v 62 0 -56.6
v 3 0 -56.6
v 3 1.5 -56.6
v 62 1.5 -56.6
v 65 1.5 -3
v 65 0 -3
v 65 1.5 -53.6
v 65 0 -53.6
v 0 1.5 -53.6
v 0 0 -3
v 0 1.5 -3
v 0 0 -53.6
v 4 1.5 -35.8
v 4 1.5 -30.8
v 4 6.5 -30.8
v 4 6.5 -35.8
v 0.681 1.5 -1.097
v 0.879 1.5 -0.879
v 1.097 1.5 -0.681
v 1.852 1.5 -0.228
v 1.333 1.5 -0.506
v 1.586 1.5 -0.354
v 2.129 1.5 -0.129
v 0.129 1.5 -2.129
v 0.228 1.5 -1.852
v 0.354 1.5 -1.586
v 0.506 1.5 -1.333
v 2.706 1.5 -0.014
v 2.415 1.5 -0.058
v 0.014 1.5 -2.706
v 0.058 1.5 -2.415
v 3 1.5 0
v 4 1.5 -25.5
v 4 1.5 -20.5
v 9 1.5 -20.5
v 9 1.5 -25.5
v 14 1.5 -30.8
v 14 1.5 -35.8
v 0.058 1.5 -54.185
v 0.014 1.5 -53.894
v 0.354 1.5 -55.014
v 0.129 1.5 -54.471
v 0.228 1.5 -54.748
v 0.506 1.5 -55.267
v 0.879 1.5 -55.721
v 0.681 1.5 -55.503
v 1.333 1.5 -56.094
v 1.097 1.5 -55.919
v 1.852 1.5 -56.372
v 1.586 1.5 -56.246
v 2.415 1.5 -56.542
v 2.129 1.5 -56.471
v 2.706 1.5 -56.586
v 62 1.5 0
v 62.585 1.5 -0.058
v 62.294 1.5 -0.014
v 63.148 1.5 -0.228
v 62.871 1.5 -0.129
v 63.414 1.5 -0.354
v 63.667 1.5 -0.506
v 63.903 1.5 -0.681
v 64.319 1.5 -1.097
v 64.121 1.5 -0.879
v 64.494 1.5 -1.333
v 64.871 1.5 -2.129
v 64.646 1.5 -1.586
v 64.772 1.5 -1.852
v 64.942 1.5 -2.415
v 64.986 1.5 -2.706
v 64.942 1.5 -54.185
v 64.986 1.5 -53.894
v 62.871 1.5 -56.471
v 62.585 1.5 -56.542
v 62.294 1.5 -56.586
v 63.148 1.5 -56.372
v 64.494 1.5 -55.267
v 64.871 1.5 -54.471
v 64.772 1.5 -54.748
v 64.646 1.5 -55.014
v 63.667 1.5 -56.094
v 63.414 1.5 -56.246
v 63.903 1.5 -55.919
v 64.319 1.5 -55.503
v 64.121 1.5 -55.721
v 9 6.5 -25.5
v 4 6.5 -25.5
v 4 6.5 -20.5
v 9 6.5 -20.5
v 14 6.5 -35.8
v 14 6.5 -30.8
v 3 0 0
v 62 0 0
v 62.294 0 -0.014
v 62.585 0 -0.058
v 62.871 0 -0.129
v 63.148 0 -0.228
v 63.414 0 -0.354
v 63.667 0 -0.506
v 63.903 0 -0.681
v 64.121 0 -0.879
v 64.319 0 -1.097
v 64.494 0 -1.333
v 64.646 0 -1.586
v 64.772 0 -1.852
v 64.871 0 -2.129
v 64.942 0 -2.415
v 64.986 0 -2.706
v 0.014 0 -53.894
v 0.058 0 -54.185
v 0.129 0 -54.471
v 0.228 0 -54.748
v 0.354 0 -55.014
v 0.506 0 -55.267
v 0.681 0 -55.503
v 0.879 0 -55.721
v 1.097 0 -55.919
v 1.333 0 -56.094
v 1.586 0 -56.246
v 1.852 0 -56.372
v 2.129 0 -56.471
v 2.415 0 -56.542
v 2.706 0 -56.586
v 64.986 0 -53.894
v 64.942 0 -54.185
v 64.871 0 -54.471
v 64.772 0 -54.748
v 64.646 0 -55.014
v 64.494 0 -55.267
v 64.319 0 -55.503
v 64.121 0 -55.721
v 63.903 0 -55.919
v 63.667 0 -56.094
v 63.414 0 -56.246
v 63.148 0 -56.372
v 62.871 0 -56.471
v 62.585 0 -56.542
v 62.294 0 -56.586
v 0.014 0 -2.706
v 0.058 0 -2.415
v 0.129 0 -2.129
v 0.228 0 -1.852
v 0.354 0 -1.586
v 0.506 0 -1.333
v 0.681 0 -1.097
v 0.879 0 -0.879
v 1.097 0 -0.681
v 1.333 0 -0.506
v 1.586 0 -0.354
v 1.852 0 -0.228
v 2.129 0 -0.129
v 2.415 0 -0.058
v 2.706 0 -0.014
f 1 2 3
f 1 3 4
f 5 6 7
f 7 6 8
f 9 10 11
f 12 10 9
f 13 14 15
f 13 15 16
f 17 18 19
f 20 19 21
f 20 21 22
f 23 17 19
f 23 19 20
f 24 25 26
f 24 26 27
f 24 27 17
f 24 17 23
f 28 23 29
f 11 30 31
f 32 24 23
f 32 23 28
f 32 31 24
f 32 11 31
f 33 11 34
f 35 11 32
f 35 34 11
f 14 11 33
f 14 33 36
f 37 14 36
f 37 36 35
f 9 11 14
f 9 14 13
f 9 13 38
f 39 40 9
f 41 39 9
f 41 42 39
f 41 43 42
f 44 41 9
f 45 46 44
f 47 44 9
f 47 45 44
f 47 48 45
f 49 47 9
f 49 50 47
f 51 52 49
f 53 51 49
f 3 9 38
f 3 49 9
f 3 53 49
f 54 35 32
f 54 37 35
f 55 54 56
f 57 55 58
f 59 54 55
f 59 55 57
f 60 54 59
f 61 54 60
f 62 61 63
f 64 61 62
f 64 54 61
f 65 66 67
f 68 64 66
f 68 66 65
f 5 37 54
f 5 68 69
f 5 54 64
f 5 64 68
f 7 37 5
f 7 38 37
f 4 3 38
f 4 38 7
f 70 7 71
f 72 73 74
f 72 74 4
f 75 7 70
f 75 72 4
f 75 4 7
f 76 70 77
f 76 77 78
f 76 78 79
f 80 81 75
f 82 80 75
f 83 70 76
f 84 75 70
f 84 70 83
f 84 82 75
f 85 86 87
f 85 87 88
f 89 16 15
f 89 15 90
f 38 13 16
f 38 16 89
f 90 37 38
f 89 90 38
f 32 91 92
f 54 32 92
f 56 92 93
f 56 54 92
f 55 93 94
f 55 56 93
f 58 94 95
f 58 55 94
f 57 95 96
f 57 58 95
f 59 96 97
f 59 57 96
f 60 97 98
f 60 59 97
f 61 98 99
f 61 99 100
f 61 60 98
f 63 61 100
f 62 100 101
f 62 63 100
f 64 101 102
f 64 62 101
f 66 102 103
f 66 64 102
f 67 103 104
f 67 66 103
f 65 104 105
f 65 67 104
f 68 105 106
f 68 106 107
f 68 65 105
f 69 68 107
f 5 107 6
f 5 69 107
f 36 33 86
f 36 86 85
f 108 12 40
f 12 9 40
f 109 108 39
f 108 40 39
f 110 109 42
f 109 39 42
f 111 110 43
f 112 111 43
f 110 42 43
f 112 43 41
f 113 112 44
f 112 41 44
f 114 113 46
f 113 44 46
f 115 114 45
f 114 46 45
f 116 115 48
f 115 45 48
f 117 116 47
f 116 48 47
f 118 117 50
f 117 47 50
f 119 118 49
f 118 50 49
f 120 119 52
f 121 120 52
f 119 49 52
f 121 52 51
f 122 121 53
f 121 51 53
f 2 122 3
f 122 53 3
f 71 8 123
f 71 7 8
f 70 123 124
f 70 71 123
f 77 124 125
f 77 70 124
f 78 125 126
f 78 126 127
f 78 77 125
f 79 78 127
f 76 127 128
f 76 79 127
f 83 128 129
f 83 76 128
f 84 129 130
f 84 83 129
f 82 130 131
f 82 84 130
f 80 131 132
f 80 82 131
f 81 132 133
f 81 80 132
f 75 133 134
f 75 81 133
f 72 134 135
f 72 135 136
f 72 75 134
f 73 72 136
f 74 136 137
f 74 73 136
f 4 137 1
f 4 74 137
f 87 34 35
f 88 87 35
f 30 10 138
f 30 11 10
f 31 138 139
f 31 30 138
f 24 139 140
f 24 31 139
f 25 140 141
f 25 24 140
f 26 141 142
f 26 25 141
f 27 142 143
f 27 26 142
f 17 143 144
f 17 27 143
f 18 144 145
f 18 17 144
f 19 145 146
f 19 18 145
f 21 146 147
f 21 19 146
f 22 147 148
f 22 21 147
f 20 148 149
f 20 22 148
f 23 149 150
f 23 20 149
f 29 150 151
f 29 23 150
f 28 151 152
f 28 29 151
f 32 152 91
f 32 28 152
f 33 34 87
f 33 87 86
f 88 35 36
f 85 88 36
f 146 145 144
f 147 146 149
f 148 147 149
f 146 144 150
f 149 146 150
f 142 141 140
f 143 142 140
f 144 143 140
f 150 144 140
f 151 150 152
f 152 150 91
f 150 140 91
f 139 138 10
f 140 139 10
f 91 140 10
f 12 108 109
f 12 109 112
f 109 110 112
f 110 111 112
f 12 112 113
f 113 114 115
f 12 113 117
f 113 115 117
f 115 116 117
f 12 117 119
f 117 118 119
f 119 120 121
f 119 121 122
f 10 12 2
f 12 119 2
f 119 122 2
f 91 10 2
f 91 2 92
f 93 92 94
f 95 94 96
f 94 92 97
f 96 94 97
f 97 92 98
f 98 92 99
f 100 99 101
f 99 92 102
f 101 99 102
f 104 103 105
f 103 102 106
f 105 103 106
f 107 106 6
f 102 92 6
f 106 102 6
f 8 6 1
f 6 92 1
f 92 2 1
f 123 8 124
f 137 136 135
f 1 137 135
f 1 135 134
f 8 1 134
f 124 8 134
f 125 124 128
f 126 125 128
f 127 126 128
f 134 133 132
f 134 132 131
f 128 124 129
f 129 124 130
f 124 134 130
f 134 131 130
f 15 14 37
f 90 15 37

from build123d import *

# Parameters (mm, degrees)
SKETCH1_W           = 65
SKETCH1_H           = 56.6
BOSS_EXTRUDE1_DEPTH = 1.5
FILLET1_R           = 3
SKETCH2_W           = 5
SKETCH2_H           = 5
SKETCH2_W_2         = 10
BOSS_EXTRUDE2_DEPTH = 5


with BuildPart() as part:
    # Sketch1 → Boss-Extrude1 (new body)
    with BuildSketch(Plane(origin=(0, 0, 0), x_dir=(1, 0, 0), z_dir=(0, 1, 0))):
        with Locations((32.5, 28.3)):
            Rectangle(SKETCH1_W, SKETCH1_H)
    extrude(amount=BOSS_EXTRUDE1_DEPTH)

    # Fillet1
    fillet1_edges = [part.edges().sort_by_distance(p)[0] for p in [
        (0, 0.75, -56.6),
        (65, 0.75, -56.6),
        (65, 0.75, 0),
        (0, 0.75, 0),
    ]]
    fillet(fillet1_edges, radius=FILLET1_R)

    # Sketch2 → Boss-Extrude2 (add)
    with BuildSketch(Plane(origin=(0, 1.5, 0), x_dir=(1, 0, 0), z_dir=(0, 1, 0))):
        with Locations((6.5, 23)):
            Rectangle(SKETCH2_W, SKETCH2_H)
        with Locations((9, 33.3)):
            Rectangle(SKETCH2_W_2, SKETCH2_H)
    extrude(amount=BOSS_EXTRUDE2_DEPTH)


solid = part.part
